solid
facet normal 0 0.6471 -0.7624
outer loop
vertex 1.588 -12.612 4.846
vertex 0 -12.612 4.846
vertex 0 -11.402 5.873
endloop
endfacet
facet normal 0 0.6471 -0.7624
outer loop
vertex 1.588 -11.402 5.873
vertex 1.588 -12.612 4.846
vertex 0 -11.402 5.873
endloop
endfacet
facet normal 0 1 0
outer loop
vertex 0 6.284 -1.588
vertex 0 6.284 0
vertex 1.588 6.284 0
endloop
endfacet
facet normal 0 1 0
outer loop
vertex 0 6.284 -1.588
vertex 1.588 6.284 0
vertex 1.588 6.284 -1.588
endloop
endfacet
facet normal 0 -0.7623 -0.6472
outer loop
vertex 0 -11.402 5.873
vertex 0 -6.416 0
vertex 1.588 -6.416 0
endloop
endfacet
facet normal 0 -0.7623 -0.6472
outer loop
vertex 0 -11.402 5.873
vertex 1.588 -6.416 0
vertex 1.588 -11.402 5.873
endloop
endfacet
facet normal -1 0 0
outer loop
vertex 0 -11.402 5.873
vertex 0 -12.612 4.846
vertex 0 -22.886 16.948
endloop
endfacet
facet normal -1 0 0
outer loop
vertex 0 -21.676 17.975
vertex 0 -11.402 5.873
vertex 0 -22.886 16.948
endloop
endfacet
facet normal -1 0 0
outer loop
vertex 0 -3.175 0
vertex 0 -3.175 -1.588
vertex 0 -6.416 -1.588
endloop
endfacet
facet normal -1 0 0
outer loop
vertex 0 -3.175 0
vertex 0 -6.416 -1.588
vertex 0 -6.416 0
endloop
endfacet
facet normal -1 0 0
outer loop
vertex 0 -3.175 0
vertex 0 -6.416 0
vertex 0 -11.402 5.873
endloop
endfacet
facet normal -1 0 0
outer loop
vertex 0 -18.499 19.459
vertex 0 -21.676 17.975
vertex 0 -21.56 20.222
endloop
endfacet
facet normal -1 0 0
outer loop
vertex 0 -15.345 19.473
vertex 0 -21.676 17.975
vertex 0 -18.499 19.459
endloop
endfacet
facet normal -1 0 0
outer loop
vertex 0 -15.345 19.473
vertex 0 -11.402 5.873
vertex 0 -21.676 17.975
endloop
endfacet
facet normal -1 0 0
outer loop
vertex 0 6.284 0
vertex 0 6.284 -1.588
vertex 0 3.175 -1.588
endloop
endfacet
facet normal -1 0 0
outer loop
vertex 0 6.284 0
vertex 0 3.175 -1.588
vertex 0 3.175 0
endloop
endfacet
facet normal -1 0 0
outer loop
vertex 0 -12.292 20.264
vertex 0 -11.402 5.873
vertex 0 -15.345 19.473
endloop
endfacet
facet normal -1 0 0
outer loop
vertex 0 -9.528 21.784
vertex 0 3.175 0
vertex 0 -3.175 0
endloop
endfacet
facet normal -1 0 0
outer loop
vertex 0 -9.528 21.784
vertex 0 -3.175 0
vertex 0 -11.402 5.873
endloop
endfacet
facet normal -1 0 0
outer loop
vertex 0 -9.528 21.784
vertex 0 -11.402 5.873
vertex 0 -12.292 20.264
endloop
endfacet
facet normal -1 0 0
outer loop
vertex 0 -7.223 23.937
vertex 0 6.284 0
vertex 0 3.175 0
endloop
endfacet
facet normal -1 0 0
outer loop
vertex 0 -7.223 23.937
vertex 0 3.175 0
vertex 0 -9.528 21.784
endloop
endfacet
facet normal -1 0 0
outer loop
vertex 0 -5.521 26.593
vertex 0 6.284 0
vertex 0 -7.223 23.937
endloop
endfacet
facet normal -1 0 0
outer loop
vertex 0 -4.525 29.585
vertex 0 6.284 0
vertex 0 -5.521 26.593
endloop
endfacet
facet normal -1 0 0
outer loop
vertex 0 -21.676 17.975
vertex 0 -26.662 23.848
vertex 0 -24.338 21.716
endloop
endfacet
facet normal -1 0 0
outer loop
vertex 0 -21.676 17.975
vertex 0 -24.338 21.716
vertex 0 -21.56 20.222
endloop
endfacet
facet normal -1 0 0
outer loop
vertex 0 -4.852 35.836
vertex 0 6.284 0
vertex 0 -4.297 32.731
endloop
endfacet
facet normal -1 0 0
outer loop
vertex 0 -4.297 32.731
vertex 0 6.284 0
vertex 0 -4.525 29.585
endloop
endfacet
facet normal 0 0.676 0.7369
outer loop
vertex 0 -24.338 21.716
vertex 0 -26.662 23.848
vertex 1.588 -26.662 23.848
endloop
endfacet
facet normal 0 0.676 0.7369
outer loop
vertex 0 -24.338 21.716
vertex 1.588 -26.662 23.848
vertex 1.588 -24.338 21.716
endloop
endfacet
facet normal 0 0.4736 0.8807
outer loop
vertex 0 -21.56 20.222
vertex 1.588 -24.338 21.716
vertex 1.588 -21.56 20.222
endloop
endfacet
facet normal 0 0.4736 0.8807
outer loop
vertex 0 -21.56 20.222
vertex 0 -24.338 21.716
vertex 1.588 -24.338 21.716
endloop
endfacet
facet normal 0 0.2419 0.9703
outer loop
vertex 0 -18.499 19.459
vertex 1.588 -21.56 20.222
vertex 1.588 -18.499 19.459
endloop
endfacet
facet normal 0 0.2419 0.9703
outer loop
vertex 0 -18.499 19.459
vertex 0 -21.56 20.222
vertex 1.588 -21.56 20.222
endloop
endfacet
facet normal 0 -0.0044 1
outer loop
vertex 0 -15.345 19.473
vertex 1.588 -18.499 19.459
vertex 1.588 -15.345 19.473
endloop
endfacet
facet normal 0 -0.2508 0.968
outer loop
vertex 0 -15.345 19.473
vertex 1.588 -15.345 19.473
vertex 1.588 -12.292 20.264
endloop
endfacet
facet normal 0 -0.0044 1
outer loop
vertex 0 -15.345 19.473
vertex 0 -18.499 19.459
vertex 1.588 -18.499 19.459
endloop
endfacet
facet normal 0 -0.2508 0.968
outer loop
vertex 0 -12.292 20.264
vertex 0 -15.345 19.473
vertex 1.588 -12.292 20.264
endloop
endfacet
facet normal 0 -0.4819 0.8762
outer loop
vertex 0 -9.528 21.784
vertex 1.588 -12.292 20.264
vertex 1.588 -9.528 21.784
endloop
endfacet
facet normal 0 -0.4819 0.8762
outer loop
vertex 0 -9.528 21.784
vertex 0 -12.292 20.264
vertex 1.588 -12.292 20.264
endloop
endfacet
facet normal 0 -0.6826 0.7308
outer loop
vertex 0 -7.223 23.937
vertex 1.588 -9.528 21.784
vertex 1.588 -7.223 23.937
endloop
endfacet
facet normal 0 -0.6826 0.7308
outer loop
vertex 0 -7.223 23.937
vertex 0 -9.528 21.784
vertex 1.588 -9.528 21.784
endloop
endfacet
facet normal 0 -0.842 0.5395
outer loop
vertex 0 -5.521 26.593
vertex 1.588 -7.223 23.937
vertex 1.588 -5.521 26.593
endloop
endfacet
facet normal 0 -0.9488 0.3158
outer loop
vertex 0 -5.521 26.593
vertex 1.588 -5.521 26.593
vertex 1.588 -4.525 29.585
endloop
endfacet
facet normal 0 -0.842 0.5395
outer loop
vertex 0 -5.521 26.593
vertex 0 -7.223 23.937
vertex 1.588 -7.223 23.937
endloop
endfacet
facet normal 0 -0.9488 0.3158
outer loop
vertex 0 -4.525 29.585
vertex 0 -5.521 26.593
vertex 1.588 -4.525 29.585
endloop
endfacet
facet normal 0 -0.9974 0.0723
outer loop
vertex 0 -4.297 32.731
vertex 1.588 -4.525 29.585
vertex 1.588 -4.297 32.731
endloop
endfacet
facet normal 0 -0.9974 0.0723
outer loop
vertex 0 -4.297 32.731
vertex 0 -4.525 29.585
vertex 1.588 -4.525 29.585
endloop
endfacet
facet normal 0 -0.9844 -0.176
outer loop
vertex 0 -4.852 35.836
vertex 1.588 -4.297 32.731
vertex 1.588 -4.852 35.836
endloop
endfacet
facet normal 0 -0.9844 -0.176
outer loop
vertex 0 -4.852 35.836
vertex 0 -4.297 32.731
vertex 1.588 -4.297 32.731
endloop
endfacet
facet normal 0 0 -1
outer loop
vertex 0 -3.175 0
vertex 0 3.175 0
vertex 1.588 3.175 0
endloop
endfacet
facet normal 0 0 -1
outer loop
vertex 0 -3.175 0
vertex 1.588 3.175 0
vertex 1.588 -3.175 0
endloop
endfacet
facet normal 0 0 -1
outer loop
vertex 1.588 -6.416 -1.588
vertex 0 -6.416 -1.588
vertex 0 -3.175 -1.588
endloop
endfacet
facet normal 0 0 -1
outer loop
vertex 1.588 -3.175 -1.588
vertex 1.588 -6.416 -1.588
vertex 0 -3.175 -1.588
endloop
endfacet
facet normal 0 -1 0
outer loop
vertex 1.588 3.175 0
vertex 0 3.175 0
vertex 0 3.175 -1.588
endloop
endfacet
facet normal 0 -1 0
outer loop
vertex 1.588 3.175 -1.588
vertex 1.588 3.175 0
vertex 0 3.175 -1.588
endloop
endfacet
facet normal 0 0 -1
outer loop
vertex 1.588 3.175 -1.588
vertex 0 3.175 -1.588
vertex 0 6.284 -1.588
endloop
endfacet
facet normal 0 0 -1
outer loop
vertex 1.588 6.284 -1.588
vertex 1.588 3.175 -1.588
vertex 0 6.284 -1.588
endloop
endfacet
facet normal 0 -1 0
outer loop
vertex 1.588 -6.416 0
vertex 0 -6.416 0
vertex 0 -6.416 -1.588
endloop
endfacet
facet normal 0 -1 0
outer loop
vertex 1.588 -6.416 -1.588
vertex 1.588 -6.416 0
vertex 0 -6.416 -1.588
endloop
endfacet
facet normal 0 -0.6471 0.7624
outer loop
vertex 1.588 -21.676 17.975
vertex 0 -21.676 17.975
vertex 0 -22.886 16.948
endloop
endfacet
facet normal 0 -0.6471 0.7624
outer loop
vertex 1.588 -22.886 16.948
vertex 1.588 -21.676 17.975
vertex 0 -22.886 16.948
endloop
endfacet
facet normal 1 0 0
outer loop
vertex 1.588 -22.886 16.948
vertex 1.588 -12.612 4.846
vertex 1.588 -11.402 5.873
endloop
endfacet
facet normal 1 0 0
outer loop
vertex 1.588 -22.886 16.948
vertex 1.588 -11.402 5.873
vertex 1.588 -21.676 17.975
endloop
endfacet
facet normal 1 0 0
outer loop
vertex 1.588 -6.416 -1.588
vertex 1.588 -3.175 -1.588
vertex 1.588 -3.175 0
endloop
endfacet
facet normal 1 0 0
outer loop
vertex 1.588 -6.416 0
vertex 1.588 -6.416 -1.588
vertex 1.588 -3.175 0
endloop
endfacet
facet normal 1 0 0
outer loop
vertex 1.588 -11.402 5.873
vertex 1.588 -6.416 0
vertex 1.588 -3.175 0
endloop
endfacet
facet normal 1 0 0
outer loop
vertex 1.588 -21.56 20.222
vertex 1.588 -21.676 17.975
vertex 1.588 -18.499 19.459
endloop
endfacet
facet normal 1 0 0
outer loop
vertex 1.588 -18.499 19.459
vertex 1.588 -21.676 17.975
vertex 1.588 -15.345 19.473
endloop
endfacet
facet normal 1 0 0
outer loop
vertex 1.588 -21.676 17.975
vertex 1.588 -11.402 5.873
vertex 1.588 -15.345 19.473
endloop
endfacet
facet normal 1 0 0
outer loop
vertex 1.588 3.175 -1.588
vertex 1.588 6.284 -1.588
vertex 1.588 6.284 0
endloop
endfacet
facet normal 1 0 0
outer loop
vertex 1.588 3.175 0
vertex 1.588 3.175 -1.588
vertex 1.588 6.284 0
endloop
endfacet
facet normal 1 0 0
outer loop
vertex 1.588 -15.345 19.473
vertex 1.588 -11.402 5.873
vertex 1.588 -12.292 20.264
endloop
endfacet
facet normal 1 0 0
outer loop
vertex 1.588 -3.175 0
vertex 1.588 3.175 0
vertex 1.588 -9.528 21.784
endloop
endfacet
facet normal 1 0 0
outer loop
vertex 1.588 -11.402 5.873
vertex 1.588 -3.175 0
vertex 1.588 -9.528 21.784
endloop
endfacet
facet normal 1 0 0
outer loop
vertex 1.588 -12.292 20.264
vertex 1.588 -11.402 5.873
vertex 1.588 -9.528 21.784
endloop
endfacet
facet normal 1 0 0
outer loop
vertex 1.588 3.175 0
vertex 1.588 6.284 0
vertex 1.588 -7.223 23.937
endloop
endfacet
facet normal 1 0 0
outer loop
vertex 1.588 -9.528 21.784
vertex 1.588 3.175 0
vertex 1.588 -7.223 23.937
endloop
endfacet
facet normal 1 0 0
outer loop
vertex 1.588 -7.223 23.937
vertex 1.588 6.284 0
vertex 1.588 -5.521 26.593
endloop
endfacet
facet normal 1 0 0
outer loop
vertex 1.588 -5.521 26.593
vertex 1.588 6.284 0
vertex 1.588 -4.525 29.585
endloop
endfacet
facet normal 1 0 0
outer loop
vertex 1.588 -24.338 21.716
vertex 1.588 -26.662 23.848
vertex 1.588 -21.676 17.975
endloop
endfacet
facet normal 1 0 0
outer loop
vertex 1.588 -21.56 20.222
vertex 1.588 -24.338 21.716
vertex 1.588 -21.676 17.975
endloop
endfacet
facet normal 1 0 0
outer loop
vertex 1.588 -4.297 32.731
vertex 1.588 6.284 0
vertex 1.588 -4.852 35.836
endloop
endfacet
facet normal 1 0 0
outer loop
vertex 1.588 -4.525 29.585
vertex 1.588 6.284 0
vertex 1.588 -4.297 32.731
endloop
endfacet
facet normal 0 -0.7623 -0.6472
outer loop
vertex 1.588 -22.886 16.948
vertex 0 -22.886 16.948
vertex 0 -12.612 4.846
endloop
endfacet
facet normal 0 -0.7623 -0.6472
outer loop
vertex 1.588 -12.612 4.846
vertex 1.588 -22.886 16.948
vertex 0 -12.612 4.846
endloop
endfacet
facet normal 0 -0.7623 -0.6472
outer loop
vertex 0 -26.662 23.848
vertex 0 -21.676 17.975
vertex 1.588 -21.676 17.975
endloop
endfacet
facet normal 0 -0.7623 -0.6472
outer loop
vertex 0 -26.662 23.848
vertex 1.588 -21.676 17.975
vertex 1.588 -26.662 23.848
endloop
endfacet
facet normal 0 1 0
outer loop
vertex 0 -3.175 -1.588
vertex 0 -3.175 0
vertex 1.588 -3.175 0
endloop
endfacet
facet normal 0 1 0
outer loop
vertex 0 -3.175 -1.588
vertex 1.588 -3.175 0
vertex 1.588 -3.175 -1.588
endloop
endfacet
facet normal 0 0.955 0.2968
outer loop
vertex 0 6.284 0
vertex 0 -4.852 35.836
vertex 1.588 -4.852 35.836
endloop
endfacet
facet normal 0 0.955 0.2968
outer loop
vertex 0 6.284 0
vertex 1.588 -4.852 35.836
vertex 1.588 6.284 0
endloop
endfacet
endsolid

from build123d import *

# Parameters (mm, degrees)
SKETCH1_W           = 1.5875
SKETCH1_H           = 3.109195134
SKETCH1_H_2         = 3.240804866
BOSS_EXTRUDE1_DEPTH = 1.5875


with BuildPart() as part:
    # Sketch1 → Boss-Extrude1 (new body)
    with BuildSketch(Plane(origin=(0, 0, 0), x_dir=(0, 0, -1), z_dir=(1, 0, 0))):
        with BuildLine():
            ThreePointArc((-23.848326893, -26.661593728), (-20.937975975, -10.862409095), (-35.836269612, -4.8519828))
            Line((-35.836269612, -4.8519828), (0, 6.284195134))
            Line((0, 6.284195134), (0, -6.415804866))
            Line((0, -6.415804866), (-23.848326893, -26.661593728))
        make_face()
        with Locations((0.79375, 4.729597567)):
            Rectangle(SKETCH1_W, SKETCH1_H)
        with Locations((0.79375, -4.795402433)):
            Rectangle(SKETCH1_W, SKETCH1_H_2)
        Polygon((-4.845708228, -12.611927822), (-5.873104867, -11.401716106), (-17.975222027, -21.675682489), (-16.947825388, -22.885894205), align=None)
    extrude(amount=BOSS_EXTRUDE1_DEPTH)


solid = part.part
